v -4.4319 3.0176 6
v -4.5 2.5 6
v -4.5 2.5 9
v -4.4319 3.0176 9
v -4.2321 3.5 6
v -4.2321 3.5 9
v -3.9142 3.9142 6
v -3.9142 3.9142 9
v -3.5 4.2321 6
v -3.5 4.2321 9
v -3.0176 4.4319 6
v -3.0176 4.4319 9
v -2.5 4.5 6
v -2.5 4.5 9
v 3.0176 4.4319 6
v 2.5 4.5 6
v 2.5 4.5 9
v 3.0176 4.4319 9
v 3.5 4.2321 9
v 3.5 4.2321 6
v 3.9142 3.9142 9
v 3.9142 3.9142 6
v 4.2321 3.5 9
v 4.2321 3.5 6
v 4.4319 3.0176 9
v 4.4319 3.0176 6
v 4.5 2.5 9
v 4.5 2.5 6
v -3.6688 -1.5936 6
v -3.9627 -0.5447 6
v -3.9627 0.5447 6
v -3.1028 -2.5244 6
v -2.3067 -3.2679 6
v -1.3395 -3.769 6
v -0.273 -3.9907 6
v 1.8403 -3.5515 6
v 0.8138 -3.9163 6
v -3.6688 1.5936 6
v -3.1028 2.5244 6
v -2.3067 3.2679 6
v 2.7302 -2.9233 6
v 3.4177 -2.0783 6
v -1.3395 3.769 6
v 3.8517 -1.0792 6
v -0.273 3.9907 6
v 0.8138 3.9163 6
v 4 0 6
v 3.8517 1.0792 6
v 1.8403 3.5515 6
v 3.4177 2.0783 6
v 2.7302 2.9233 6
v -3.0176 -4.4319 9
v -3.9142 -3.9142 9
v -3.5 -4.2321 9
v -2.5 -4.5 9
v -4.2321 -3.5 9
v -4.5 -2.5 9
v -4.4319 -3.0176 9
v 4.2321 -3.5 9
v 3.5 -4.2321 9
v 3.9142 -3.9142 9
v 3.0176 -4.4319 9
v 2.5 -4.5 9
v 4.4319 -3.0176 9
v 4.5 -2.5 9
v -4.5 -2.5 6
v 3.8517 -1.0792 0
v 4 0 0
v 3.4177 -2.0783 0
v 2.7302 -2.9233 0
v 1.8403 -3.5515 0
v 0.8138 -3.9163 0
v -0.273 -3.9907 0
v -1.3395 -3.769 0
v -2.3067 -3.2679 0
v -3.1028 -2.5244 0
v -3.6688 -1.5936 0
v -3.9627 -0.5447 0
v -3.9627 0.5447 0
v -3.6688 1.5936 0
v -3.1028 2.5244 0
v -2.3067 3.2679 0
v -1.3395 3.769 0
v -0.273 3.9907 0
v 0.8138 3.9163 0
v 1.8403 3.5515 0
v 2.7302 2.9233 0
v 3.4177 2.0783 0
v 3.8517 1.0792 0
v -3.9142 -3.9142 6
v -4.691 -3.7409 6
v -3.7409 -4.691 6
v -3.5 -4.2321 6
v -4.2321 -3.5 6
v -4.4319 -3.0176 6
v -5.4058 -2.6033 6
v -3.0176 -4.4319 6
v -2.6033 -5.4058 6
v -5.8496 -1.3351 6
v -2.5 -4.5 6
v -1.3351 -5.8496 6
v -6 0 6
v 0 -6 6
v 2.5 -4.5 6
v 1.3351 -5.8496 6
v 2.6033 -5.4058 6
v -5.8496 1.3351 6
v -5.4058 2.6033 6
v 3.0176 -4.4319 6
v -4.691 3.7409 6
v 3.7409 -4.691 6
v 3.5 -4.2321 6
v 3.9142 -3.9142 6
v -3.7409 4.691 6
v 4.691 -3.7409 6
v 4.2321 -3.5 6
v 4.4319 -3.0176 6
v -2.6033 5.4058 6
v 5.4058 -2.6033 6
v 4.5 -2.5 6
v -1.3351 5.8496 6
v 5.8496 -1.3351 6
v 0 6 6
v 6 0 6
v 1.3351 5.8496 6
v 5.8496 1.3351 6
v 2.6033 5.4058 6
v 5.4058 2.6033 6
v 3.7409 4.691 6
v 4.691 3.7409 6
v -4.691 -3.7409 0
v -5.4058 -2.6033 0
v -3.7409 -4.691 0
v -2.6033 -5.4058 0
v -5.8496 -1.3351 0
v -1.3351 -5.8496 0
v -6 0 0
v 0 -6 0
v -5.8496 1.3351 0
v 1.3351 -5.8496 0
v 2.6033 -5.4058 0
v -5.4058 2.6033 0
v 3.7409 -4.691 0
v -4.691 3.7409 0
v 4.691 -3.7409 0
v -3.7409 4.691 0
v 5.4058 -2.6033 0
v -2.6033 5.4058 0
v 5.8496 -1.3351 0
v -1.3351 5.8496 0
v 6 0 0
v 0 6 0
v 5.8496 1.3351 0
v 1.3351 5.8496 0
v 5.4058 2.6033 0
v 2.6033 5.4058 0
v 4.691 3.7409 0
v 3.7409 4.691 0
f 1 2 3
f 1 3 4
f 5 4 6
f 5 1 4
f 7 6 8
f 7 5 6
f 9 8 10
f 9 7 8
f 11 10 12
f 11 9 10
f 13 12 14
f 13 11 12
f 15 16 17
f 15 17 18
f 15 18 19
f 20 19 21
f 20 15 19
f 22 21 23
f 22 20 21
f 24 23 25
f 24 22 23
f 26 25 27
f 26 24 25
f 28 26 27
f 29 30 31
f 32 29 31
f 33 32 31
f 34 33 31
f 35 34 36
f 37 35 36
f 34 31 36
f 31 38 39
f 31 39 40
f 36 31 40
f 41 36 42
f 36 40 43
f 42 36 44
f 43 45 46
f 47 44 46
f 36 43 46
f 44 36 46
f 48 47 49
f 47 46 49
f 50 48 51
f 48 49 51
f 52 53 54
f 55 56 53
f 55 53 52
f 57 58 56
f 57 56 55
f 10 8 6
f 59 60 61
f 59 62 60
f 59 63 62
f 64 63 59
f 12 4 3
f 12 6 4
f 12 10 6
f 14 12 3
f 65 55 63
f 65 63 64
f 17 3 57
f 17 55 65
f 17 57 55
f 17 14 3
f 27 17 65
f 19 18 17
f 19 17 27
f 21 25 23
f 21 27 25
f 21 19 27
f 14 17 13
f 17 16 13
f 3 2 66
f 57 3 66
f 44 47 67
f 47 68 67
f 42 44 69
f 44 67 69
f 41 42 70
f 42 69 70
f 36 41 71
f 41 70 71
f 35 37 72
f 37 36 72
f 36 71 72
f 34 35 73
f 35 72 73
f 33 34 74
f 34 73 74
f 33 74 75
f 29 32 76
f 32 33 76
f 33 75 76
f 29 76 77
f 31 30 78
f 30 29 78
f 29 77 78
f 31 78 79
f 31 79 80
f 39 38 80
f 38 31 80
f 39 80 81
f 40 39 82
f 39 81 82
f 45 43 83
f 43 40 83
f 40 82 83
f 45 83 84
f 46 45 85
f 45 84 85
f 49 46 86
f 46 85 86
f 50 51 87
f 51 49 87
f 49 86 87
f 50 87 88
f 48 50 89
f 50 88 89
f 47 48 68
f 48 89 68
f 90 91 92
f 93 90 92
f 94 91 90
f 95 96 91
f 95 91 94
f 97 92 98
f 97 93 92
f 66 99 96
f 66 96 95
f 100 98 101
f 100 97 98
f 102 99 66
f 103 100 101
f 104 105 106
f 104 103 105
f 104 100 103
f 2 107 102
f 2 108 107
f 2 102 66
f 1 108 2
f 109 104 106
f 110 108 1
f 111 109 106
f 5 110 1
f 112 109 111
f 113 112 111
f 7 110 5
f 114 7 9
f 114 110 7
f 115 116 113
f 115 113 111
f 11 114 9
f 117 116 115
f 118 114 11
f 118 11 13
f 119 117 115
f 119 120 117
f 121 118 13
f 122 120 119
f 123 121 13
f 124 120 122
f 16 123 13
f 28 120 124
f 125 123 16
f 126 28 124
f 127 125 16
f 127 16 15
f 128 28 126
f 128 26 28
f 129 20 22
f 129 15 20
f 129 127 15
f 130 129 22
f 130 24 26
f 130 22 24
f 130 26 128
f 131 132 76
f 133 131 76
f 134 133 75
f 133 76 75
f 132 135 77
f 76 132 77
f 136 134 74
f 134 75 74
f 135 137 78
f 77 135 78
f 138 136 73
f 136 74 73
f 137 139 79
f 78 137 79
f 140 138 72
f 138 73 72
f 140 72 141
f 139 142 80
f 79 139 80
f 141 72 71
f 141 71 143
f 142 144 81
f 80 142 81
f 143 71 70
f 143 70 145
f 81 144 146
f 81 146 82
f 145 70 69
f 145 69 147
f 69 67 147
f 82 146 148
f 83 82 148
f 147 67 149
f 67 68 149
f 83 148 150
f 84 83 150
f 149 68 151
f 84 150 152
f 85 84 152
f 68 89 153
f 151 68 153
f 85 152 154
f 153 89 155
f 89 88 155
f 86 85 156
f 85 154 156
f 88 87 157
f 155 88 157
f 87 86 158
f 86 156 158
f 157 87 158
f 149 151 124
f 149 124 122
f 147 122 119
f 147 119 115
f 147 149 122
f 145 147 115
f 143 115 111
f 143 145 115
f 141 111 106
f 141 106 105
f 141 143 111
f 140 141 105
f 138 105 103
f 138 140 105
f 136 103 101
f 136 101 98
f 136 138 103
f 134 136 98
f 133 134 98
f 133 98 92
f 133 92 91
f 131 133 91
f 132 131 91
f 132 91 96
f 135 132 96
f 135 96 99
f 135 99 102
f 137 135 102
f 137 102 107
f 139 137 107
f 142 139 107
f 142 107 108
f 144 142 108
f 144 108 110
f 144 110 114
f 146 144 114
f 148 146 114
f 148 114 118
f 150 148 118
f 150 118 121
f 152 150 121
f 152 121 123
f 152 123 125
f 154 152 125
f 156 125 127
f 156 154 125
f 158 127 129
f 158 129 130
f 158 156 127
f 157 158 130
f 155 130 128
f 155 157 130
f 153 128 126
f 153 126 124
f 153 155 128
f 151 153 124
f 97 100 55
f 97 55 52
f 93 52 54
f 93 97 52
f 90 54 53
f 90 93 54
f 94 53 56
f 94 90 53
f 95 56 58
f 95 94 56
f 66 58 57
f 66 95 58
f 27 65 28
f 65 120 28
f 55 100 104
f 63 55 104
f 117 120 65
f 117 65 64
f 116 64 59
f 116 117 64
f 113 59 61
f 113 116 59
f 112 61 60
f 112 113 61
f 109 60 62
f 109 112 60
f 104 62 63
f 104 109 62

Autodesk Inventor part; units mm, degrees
ref_plane "YZ Plane" through (0, 0, 0) normal (1, 0, 0) x (0, 1, 0)
ref_plane "XZ Plane" through (0, 0, 0) normal (0, 1, 0) x (-1, 0, 0)
ref_plane "XY Plane" through (0, 0, 0) normal (0, 0, 1) x (1, 0, 0)
sketch "Sketch1" plane through (0, 0, 0) normal (0, 0, 1) x (1, 0, 0)
  circle A0 centre (0, 0) radius 4
  circle A1 centre (0, 0) radius 6
  dimension "d0" = 8
  dimension "d1" = 12
extrude "Extrusion1" add sketch "Sketch1" along normal blind 6
sketch "Sketch2" plane through (0, 0, 6) normal (0, 0, 1) x (1, 0, 0)
  line L0 (-4.5, -4.5) -> (4.5, -4.5)
  line L1 (4.5, -4.5) -> (4.5, 4.5)
  line L2 (4.5, 4.5) -> (-4.5, 4.5)
  line L3 (-4.5, 4.5) -> (-4.5, -4.5)
  line L4 (-4.5, -4.5) -> (4.5, 4.5) construction
  line L5 (4.5, -4.5) -> (-4.5, 4.5) construction
  point P0 (0, 0)
  dimension "d4" = 9
  dimension "d5" = 9
extrude "Extrusion2" add sketch "Sketch2" along normal blind 3
fillet "Fillet1" radius 2 4 edges at (-4.5, -4.5, 7.5) (-4.5, 4.5, 7.5) (4.5, 4.5, 7.5) (4.5, -4.5, 7.5)
thread "Thread1" size "M8x1.25" class "6H" standard "ANSI Metric M Profile" length 6
properties part number "Nakrętka na belkę" material "Aluminum 6061"
